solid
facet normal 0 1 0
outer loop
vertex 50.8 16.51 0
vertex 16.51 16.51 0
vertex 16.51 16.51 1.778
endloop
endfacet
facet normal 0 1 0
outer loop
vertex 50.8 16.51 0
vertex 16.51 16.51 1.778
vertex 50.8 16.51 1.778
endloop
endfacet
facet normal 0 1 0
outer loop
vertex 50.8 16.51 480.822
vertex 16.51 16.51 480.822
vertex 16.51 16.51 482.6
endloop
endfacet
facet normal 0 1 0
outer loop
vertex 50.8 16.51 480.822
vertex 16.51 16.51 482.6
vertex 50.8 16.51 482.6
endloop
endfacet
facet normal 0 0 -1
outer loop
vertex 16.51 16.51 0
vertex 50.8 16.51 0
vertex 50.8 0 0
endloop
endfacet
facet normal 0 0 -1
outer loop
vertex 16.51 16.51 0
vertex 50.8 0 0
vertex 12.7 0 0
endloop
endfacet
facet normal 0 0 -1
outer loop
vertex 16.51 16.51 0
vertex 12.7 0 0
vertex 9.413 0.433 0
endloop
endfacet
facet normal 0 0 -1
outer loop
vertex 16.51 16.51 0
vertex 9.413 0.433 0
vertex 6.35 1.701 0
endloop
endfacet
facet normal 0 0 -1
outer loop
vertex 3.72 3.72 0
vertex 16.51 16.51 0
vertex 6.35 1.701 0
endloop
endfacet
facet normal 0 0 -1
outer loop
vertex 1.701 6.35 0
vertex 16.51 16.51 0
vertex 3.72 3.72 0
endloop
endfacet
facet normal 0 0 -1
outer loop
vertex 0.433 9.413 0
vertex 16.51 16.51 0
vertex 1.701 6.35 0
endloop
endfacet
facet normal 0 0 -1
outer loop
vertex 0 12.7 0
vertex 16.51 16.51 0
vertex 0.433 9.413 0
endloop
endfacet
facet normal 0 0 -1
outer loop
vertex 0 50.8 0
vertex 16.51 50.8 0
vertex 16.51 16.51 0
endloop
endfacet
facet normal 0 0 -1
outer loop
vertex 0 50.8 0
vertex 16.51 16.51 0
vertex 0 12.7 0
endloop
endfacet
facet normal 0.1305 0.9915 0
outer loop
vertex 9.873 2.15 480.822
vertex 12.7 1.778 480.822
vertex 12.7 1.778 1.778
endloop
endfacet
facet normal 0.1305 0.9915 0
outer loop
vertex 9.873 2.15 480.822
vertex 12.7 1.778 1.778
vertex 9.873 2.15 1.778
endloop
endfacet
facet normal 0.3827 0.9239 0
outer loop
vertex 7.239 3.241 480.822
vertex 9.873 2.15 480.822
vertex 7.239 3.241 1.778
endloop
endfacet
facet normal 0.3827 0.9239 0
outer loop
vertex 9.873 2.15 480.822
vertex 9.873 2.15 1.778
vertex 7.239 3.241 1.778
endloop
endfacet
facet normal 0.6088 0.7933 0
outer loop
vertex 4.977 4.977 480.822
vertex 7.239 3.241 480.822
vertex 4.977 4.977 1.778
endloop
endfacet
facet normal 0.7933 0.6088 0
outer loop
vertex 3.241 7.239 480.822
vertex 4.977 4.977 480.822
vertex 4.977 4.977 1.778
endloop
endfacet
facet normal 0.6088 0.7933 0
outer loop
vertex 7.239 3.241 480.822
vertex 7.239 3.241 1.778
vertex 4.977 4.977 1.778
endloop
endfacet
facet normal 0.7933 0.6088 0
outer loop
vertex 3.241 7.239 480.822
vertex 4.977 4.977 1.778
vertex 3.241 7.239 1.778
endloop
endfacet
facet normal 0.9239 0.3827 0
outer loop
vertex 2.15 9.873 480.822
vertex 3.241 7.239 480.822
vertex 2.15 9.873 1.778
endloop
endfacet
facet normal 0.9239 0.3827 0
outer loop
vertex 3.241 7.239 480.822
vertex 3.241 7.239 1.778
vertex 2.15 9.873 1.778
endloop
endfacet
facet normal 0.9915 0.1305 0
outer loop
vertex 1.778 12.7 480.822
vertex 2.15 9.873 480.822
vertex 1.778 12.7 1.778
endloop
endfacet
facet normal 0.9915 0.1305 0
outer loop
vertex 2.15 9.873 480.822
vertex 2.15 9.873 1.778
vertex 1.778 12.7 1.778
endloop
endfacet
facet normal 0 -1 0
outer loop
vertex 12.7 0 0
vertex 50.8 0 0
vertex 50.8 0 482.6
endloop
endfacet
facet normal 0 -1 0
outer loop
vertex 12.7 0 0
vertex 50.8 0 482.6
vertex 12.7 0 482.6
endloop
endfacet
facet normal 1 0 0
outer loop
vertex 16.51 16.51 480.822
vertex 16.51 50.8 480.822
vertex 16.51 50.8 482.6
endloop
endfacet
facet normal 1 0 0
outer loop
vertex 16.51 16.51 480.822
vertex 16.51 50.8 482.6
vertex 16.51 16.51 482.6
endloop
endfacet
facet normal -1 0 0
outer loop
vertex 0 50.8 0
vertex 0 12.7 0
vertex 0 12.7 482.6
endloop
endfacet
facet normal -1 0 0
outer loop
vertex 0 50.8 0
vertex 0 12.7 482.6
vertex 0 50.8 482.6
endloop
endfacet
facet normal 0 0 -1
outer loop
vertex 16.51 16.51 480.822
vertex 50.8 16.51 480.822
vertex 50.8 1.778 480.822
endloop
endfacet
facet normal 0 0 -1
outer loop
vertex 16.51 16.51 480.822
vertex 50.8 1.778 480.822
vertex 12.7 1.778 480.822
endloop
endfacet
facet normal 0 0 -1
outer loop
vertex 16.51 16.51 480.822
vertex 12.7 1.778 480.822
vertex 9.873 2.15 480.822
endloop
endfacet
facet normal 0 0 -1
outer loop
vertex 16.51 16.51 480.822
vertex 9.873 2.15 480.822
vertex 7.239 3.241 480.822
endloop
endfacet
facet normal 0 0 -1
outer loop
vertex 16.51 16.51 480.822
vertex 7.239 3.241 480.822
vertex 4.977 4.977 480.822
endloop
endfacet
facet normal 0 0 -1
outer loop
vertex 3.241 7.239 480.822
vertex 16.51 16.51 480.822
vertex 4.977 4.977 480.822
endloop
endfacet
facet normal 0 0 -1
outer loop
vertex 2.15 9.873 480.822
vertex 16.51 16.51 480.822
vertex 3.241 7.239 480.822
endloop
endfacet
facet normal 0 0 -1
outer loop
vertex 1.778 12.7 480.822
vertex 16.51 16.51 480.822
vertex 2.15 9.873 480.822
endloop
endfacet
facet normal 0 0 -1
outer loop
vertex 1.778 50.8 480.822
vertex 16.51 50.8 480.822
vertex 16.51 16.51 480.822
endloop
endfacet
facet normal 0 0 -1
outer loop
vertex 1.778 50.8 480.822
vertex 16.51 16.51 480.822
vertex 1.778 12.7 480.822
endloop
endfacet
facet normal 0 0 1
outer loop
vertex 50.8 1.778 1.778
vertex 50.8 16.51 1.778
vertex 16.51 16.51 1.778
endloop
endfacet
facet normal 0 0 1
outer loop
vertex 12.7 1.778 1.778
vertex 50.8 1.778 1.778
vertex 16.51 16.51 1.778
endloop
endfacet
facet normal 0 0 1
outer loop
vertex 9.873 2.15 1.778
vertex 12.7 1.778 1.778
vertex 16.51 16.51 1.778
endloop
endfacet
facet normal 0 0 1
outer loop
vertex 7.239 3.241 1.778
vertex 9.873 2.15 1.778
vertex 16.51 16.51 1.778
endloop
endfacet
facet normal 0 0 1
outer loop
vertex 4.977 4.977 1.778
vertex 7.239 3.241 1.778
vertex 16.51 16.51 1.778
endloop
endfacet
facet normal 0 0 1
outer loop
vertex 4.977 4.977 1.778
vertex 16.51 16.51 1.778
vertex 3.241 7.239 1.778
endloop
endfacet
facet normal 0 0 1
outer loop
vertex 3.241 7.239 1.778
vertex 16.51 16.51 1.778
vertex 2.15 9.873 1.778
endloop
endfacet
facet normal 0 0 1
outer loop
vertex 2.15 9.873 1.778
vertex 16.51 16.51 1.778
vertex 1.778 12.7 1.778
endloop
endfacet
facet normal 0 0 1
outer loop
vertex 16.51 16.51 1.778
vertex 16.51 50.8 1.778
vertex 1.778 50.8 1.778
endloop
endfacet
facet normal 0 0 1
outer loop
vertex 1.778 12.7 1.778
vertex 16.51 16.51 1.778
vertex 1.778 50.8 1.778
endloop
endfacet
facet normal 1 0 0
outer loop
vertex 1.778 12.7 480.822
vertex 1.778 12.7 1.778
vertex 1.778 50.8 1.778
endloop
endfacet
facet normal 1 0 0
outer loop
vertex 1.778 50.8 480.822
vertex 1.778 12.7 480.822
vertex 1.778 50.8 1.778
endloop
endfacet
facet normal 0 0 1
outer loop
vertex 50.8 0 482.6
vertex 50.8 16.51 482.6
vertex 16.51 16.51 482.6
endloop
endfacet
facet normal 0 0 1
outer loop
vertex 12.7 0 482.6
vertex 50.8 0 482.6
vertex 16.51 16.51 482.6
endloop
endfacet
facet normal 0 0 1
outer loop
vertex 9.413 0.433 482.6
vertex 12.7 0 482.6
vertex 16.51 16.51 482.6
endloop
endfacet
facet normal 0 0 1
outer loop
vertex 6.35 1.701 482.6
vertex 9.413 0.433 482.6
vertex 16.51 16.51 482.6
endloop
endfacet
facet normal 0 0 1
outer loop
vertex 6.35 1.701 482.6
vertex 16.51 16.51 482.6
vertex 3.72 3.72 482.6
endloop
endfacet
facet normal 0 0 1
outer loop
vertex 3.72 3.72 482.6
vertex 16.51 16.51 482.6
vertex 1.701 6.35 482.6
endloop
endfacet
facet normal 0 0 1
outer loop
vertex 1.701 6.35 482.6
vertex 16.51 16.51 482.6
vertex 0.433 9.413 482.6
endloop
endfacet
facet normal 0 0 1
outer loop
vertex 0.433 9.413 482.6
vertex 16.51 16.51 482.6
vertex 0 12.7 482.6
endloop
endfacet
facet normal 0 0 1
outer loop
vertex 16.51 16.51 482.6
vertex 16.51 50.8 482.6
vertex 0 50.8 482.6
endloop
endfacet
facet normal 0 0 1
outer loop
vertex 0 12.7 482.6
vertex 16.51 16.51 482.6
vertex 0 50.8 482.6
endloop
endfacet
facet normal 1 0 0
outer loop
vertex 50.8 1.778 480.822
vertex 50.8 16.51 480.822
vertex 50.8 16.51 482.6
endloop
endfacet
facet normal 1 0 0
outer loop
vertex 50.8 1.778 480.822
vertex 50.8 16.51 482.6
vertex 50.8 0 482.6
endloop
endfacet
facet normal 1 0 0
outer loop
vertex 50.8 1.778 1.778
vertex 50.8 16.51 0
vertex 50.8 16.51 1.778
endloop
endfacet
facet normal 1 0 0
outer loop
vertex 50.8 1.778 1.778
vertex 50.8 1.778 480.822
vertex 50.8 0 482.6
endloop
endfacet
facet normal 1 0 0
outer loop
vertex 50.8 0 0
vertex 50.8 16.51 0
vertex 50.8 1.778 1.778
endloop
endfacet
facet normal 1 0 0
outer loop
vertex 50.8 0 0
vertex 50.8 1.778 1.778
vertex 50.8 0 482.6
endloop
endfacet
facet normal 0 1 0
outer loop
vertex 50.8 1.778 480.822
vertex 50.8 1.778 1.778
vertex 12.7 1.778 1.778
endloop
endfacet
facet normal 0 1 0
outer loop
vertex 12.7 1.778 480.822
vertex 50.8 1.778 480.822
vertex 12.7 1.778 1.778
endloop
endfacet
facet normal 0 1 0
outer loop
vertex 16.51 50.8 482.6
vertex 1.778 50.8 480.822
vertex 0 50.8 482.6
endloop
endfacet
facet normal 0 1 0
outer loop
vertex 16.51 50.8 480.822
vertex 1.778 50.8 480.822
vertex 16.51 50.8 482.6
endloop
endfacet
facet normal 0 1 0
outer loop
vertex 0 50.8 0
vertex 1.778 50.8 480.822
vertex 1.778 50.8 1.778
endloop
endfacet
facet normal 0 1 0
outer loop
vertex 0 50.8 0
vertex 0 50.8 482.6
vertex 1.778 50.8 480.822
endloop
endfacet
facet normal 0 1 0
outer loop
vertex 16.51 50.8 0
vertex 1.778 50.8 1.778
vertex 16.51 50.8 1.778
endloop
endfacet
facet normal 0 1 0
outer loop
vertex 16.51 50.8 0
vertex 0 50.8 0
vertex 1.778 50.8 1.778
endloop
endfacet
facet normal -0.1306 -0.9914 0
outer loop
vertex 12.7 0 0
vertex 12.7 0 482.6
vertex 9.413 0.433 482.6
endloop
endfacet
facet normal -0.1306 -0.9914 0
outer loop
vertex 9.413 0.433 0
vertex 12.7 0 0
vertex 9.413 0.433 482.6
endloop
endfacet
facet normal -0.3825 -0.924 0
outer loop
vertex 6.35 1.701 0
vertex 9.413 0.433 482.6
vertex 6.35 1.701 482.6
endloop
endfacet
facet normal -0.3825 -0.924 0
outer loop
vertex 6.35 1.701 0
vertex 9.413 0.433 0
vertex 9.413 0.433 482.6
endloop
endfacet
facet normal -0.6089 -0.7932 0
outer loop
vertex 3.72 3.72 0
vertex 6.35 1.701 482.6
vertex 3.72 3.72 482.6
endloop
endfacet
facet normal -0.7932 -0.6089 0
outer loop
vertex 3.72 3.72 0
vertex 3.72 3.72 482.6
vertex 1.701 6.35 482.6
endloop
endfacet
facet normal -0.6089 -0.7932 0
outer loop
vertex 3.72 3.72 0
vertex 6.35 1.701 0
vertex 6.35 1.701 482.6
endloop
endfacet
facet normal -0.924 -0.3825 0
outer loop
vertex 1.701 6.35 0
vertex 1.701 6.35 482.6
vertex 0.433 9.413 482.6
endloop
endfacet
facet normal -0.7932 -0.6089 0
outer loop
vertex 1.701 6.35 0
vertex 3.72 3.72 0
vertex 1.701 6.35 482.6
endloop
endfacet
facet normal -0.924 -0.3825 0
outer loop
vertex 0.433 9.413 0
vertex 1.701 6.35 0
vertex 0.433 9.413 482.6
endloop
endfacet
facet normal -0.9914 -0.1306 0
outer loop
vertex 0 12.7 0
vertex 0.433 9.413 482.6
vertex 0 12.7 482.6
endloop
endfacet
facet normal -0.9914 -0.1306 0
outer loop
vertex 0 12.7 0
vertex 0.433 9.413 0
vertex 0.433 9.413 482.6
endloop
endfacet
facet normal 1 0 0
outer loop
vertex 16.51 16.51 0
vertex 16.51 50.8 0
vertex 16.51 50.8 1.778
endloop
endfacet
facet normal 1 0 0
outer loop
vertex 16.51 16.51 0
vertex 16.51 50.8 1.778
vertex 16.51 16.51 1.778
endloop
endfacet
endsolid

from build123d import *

# Parameters (mm, degrees)
BOSS_EXTRUDE1_DEPTH = 482.6
SHELL1_T            = -1.778


with BuildPart() as part:
    # Sketch1 → Boss-Extrude1 (new body)
    with BuildSketch(Plane.XY):
        with BuildLine():
            Line((0, 12.7), (0, 50.8))
            Line((0, 50.8), (16.51, 50.8))
            Line((16.51, 50.8), (16.51, 16.51))
            Line((16.51, 16.51), (50.8, 16.51))
            Line((50.8, 16.51), (50.8, 0))
            Line((50.8, 0), (12.7, 0))
            ThreePointArc((12.7, 0), (3.719743879, 3.719743879), (0, 12.7))
        make_face()
    extrude(amount=BOSS_EXTRUDE1_DEPTH)

    # Shell1
    shell1_openings = [part.faces().sort_by_distance(p)[0] for p in [
        (16.51, 33.655, 241.3),
        (33.655, 16.51, 241.3),
        (50.8, 8.255, 241.3),
        (8.255, 50.8, 241.3),
    ]]
    offset(amount=SHELL1_T, openings=shell1_openings, kind=Kind.INTERSECTION)


solid = part.part
